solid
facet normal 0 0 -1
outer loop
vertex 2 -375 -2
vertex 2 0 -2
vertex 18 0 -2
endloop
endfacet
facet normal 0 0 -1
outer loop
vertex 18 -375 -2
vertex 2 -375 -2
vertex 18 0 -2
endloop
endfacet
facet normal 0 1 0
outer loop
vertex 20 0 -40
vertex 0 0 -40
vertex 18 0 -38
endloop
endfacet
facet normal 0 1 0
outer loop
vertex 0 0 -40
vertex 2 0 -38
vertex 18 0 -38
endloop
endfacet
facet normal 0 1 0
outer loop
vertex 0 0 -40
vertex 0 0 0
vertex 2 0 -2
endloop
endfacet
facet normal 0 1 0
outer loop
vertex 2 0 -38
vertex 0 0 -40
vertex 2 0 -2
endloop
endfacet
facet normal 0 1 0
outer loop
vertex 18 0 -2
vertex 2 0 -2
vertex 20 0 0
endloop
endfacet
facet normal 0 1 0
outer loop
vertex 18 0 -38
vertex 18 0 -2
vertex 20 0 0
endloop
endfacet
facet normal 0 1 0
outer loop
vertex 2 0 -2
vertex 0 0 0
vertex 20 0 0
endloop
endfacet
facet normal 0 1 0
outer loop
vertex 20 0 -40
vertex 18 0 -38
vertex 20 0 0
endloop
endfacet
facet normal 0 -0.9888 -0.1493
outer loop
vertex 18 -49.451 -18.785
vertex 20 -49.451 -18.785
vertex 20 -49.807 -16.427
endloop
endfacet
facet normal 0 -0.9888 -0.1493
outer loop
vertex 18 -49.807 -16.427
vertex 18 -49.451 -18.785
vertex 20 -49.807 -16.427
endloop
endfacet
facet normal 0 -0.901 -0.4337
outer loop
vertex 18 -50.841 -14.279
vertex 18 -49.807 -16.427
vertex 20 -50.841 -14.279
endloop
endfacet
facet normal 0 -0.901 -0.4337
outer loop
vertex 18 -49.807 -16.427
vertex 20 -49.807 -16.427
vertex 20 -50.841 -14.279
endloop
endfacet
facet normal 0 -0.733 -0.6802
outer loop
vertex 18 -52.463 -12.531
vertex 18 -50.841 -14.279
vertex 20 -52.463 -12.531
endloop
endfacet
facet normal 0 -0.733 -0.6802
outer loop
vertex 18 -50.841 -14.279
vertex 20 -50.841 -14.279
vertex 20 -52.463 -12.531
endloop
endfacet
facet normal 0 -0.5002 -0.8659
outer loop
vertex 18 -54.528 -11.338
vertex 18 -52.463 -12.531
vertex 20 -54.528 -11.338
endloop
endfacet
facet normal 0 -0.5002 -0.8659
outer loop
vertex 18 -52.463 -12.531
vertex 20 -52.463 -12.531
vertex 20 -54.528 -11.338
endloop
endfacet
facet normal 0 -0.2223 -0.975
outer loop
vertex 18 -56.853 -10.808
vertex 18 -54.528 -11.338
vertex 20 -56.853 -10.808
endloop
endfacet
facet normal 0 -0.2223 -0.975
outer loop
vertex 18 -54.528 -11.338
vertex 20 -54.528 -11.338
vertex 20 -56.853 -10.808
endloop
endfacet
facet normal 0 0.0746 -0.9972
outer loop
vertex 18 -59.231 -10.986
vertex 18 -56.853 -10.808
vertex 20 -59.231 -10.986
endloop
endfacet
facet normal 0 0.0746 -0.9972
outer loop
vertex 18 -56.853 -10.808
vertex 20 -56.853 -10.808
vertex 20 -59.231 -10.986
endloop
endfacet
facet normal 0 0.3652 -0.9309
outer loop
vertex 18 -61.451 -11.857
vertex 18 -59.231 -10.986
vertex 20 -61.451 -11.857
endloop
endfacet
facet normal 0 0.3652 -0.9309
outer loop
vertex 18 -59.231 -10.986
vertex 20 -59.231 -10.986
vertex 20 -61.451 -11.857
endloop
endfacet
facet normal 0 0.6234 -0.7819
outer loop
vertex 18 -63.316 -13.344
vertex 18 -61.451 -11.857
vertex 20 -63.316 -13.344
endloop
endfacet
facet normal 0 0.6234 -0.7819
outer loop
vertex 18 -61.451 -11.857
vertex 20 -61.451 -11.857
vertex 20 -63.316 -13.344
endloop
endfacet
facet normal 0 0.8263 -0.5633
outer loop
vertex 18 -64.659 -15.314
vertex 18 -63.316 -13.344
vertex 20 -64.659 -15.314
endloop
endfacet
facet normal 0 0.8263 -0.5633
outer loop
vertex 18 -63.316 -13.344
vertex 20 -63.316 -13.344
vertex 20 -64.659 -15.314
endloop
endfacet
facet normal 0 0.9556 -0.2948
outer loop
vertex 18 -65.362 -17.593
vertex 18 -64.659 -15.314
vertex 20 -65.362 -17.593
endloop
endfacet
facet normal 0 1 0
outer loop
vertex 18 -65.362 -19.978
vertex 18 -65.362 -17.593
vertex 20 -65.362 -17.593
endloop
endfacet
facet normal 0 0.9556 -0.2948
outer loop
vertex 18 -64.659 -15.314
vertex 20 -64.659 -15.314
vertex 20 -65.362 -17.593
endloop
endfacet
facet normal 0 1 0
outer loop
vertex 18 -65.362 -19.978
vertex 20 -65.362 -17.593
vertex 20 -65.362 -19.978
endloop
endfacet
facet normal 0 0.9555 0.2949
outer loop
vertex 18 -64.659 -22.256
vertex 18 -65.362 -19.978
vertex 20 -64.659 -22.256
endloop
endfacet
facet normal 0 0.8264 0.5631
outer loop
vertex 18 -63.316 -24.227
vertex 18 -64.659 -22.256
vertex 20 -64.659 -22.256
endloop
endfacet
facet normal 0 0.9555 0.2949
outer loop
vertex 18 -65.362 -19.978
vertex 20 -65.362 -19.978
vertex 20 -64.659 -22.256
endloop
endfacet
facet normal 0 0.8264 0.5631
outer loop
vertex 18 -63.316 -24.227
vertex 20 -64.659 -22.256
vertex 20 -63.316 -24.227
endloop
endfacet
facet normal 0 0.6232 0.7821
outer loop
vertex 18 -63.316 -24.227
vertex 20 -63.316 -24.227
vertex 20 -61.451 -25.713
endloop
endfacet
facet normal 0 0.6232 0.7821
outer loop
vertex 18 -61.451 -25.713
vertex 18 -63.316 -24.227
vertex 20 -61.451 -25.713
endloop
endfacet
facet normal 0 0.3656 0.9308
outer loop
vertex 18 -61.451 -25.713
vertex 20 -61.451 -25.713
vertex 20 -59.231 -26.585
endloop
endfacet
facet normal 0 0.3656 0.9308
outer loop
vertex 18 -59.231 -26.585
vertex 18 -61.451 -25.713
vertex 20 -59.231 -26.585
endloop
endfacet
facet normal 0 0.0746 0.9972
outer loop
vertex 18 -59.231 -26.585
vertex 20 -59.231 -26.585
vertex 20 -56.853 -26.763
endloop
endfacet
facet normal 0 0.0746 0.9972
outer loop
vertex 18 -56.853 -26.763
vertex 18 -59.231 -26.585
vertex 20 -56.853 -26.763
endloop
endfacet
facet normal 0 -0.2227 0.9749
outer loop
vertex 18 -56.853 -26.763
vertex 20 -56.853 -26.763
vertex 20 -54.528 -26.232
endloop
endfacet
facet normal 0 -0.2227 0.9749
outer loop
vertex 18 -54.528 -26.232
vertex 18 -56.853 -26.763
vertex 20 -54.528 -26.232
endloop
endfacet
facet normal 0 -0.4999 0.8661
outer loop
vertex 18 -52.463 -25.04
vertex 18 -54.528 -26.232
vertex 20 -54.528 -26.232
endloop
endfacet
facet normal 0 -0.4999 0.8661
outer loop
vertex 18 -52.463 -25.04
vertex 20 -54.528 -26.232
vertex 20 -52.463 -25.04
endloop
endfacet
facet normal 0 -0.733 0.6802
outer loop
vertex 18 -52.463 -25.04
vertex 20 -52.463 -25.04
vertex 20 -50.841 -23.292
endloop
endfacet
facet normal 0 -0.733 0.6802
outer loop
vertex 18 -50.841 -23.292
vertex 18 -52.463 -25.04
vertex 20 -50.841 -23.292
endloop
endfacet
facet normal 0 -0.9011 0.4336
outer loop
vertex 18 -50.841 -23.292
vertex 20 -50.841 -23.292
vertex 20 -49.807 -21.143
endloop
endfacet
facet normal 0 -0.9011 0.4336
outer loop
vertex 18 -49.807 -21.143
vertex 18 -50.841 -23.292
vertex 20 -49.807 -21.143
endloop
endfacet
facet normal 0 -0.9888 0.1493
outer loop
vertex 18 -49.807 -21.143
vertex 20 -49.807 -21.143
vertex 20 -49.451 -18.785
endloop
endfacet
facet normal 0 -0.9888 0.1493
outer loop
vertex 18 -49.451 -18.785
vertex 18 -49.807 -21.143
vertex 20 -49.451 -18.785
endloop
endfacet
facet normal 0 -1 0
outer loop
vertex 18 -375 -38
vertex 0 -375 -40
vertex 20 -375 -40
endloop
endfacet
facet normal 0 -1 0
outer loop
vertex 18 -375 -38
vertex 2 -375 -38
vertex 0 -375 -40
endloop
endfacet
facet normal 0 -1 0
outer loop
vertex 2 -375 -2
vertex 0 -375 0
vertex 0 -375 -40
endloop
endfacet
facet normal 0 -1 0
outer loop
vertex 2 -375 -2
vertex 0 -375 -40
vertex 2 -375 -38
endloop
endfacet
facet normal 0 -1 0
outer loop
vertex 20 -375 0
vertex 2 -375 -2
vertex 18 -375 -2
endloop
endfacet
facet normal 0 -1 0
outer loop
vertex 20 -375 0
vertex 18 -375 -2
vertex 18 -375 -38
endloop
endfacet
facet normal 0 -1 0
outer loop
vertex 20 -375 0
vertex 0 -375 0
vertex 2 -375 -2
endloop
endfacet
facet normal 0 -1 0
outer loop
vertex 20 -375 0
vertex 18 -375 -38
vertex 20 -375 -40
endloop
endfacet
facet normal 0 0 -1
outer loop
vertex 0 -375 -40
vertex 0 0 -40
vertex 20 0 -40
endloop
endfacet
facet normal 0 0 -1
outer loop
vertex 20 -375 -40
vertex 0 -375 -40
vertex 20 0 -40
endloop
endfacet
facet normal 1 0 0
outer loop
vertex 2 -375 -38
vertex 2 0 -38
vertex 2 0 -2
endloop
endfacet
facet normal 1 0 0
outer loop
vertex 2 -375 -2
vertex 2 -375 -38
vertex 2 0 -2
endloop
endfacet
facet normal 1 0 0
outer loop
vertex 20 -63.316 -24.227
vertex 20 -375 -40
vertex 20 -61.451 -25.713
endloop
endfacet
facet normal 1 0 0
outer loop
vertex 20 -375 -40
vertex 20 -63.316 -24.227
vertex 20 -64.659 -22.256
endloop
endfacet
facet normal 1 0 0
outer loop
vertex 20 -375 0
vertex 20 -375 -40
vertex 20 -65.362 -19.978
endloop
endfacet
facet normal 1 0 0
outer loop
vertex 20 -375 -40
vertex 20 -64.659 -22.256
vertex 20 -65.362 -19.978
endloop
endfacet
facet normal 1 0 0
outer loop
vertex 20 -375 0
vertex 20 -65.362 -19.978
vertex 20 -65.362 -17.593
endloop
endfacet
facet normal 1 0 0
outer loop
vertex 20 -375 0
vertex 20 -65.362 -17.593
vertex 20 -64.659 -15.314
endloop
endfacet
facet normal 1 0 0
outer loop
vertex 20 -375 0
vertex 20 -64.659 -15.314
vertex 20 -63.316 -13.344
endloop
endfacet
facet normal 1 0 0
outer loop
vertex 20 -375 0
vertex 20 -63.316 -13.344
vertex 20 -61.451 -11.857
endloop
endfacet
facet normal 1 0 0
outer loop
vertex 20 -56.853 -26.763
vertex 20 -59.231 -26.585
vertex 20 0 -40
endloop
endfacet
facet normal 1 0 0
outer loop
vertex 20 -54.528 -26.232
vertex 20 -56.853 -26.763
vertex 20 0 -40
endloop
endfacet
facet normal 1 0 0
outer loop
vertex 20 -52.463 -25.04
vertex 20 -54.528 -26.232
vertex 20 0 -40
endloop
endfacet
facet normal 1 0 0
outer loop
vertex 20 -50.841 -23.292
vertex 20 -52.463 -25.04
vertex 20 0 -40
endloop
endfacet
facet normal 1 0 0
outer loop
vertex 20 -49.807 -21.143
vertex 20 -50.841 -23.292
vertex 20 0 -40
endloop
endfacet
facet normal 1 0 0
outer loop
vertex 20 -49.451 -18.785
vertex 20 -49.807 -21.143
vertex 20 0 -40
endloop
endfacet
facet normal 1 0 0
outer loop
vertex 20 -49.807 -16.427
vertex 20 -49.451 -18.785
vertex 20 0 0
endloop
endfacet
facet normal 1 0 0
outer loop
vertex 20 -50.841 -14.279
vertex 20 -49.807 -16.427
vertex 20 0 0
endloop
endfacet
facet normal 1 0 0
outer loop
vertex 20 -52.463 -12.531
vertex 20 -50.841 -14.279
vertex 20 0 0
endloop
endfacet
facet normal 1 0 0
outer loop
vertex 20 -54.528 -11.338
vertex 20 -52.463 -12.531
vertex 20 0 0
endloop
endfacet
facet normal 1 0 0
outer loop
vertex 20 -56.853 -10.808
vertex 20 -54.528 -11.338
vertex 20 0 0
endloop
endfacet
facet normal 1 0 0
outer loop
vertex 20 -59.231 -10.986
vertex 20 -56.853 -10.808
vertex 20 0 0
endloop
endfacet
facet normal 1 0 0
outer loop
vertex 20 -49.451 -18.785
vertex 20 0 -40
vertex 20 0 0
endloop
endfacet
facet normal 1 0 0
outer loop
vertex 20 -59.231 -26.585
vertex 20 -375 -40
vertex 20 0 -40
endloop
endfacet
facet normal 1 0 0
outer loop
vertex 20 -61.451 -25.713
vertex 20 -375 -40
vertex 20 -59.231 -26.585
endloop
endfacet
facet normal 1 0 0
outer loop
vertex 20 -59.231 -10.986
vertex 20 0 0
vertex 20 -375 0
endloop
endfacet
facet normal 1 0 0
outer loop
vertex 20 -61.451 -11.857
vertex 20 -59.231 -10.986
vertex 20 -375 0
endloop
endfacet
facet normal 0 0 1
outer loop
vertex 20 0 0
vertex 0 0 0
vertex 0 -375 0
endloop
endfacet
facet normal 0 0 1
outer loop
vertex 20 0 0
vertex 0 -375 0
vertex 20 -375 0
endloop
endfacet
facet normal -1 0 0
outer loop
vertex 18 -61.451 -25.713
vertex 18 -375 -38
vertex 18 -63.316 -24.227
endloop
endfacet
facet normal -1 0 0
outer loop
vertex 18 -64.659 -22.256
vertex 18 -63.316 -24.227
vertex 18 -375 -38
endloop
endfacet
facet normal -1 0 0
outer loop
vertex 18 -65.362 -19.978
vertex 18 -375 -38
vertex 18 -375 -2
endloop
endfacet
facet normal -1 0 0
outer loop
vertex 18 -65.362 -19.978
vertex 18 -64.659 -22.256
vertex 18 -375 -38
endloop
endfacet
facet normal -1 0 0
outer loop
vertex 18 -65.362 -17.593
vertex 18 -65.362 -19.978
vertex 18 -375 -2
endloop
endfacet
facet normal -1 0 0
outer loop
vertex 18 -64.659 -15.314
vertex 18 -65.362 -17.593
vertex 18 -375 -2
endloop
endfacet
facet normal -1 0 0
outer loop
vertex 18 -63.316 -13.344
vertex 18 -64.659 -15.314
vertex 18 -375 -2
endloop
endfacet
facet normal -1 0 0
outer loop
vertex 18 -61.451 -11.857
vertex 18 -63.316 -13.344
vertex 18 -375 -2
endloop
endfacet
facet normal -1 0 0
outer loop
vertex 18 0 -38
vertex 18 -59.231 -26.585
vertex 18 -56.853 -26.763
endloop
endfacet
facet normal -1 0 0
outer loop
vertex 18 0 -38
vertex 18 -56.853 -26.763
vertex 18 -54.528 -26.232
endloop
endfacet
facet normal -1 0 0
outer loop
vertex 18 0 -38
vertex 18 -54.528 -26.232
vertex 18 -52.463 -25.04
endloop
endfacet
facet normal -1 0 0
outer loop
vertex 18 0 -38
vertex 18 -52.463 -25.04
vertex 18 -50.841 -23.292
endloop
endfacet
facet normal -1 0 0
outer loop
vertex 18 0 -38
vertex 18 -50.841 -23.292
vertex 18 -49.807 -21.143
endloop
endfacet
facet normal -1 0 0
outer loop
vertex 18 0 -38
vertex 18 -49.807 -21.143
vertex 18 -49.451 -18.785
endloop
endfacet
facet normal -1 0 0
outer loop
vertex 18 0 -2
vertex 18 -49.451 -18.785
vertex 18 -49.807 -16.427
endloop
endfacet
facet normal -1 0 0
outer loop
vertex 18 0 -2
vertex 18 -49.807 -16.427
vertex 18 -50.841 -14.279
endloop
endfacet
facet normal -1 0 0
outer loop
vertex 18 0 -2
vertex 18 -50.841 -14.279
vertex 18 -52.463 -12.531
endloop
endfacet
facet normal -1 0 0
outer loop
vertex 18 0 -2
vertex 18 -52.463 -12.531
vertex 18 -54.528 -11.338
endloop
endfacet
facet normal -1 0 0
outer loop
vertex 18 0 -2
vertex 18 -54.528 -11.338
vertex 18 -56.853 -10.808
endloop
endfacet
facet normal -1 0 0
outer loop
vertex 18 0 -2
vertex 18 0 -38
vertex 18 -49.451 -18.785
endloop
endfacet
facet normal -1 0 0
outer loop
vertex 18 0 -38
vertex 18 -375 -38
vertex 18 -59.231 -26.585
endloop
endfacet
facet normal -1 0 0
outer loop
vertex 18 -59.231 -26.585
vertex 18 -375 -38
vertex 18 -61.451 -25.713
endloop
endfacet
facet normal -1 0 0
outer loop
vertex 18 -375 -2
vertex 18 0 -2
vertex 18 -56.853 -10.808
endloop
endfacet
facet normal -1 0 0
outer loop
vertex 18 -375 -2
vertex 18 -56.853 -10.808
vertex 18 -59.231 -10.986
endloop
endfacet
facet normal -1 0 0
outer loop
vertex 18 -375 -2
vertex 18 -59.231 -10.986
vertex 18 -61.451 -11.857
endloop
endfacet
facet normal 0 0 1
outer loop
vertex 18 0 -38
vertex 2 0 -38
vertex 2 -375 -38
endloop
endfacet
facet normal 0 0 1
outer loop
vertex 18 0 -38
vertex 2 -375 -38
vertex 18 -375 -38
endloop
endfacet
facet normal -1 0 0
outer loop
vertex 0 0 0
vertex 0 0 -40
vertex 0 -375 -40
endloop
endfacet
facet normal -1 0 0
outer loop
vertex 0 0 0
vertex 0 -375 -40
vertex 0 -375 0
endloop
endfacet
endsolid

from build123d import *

# Parameters (mm, degrees)
F0_W     = 20
F0_H     = 40
F0_W_2   = 16
F0_H_2   = 36
F1_DEPTH = 375
F2_R     = 8
F3_DEPTH = 15


with BuildPart() as f1:
    # F0 (on Front) → F1 (new body)
    with BuildSketch(Plane.XZ):
        with Locations((10, -20)):
            Rectangle(F0_W, F0_H)
        with Locations((10, -20)):
            Rectangle(F0_W_2, F0_H_2, mode=Mode.SUBTRACT)
    extrude(amount=F1_DEPTH)

    # F2 (on face) → F3 (cut)
    with BuildSketch(Plane.YZ.offset(20)):
        with Locations((-57.451189, -18.785227)):
            Circle(F2_R)
    extrude(amount=-F3_DEPTH, mode=Mode.SUBTRACT)


solid = f1.part
